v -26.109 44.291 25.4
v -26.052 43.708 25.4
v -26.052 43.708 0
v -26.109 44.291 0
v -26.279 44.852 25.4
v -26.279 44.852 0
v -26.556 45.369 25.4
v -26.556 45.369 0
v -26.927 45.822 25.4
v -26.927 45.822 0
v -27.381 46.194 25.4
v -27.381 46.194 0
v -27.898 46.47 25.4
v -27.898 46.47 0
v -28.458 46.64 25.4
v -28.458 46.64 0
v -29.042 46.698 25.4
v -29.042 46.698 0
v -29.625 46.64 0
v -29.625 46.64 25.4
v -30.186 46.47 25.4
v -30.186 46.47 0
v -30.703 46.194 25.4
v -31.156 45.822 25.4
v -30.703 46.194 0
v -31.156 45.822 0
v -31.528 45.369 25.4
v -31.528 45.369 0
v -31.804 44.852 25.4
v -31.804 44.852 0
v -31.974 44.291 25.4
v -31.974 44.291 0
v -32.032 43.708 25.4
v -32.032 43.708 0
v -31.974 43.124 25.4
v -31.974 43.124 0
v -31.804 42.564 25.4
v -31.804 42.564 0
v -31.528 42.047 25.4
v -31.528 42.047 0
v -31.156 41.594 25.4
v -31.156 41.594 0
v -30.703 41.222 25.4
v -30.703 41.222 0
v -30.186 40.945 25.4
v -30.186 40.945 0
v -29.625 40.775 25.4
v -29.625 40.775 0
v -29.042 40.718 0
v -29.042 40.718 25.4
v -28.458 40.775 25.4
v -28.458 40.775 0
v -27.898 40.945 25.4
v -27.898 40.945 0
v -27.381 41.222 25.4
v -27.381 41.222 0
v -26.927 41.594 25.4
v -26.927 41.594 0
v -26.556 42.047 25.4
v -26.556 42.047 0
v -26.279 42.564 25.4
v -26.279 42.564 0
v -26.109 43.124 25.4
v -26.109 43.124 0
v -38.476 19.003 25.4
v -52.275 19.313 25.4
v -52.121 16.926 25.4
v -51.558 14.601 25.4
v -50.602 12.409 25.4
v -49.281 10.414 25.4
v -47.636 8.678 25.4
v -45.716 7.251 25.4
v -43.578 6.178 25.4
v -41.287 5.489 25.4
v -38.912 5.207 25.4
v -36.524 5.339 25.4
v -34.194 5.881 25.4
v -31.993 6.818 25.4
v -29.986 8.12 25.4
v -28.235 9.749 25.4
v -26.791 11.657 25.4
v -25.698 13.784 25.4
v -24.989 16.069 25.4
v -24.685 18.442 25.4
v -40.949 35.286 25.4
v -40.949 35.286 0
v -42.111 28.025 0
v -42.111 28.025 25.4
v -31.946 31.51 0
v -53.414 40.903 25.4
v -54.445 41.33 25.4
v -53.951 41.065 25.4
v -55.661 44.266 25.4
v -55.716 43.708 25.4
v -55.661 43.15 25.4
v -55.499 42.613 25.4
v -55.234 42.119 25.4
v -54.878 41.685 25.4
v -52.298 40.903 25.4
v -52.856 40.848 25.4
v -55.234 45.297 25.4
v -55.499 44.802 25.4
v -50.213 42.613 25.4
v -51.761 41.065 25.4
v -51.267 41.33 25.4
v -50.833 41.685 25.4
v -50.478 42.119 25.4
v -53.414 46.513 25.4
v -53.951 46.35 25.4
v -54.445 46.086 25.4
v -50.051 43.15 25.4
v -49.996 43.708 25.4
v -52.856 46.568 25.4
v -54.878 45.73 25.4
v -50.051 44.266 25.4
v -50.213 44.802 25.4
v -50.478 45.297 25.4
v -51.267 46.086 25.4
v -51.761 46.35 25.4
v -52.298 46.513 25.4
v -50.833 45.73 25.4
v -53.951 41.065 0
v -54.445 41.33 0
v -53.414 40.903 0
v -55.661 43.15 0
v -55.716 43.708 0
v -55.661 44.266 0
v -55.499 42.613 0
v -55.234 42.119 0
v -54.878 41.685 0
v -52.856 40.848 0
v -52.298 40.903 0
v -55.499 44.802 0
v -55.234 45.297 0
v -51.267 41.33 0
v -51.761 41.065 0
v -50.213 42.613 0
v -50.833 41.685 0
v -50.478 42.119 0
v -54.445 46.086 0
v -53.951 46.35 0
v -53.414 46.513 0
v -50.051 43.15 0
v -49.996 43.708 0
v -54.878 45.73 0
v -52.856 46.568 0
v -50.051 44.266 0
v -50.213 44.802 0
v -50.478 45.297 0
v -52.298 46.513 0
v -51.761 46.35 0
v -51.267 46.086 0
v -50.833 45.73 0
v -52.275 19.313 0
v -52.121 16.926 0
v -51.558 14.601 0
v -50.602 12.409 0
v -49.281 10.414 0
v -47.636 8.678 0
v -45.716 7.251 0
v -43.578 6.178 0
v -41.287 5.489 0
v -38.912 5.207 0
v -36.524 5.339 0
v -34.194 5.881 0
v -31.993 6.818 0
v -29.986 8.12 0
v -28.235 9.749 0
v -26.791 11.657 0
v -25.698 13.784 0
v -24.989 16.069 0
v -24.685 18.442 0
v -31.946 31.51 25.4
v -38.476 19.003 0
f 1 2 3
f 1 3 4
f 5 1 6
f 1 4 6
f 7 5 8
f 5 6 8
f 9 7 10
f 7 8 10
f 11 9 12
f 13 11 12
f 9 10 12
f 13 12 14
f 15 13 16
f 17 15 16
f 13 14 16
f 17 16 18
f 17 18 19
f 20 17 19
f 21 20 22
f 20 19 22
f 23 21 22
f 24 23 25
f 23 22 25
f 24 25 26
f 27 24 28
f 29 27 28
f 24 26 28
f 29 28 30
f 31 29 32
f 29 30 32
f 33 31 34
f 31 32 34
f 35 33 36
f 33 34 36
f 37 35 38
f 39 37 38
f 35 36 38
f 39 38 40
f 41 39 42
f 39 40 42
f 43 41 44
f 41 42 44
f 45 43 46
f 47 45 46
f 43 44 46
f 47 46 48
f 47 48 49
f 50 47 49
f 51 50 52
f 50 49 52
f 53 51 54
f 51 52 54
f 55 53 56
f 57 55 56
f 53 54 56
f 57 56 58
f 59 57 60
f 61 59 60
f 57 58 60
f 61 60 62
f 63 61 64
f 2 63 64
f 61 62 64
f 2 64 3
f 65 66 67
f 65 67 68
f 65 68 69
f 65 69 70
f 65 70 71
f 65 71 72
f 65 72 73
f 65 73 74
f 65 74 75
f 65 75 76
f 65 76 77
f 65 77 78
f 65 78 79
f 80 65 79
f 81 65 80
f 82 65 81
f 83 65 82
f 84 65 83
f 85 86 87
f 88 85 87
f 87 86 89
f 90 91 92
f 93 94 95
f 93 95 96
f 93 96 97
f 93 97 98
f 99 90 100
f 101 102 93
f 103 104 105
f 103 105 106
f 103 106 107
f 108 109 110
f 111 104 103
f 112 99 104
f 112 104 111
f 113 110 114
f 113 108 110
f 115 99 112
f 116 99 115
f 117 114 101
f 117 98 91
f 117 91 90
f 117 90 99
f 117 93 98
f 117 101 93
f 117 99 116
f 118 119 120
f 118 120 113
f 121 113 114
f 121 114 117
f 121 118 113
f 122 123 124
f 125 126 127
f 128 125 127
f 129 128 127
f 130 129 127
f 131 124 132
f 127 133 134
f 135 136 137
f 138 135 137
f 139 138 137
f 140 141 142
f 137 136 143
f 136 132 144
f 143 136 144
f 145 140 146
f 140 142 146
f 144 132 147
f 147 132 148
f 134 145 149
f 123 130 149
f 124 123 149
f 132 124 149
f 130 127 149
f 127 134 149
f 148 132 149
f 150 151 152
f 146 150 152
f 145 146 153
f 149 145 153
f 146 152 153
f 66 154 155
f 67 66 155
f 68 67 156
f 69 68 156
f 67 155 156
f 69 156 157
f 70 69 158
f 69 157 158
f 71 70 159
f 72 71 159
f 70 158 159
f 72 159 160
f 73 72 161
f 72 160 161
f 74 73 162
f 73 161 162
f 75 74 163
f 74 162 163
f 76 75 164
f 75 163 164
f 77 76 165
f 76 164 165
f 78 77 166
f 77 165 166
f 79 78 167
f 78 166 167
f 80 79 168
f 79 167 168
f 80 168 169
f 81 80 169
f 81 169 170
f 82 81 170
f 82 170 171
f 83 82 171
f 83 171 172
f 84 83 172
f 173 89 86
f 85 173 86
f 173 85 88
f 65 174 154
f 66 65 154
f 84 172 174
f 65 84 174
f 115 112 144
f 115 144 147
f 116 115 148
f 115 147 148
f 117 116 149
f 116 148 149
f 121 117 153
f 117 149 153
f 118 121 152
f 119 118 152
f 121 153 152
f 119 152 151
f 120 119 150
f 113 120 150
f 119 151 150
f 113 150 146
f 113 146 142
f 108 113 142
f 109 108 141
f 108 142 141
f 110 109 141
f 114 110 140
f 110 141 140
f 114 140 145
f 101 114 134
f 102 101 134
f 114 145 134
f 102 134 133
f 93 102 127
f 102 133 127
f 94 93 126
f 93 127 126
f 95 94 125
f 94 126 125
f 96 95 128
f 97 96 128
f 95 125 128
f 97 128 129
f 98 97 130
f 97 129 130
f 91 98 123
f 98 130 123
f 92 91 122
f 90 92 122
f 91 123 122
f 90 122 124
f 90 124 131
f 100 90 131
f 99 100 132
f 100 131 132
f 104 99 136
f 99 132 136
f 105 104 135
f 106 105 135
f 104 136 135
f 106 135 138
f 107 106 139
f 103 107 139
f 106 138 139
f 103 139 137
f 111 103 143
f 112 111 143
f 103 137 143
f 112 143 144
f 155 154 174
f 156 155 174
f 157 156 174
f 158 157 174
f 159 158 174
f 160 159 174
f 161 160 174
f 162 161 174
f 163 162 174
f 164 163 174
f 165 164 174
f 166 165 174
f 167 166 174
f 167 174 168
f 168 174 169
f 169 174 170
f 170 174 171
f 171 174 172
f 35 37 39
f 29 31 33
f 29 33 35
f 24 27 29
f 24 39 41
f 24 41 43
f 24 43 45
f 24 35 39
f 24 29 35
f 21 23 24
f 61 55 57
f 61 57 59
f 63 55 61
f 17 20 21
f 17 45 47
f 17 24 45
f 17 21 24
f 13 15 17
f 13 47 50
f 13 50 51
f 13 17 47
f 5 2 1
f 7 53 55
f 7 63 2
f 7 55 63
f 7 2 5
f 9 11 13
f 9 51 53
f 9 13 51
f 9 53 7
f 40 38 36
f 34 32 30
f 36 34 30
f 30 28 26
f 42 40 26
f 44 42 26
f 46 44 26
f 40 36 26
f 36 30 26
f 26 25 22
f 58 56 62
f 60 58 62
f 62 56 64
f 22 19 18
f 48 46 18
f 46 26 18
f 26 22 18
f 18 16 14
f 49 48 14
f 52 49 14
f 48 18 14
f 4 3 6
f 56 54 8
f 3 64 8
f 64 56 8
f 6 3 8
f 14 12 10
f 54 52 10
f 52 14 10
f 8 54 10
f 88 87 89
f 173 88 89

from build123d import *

# Parameters (mm, degrees)
F0_R     = 2.860279
F0_R_2   = 2.99003
F1_DEPTH = 25.4


with BuildPart() as f1:
    # F0 (on Top) → F1 (new body)
    with BuildSketch(Plane.XY):
        with Locations((-52.855972, 43.707822)):
            Circle(F0_R)
        with Locations((-29.041743, 43.707822)):
            Circle(F0_R_2)
        Polygon((-31.945918, 31.51029), (-40.948857, 35.285715), (-42.110525, 28.025281), align=None)
        with BuildLine():
            Line((-38.47635, 19.00251), (-52.275136, 19.312758))
            ThreePointArc((-52.275136, 19.312758), (-38.911994, 5.207113), (-24.685482, 18.441506))
            Line((-24.685482, 18.441506), (-38.47635, 19.00251))
        make_face()
    extrude(amount=F1_DEPTH)


solid = f1.part
